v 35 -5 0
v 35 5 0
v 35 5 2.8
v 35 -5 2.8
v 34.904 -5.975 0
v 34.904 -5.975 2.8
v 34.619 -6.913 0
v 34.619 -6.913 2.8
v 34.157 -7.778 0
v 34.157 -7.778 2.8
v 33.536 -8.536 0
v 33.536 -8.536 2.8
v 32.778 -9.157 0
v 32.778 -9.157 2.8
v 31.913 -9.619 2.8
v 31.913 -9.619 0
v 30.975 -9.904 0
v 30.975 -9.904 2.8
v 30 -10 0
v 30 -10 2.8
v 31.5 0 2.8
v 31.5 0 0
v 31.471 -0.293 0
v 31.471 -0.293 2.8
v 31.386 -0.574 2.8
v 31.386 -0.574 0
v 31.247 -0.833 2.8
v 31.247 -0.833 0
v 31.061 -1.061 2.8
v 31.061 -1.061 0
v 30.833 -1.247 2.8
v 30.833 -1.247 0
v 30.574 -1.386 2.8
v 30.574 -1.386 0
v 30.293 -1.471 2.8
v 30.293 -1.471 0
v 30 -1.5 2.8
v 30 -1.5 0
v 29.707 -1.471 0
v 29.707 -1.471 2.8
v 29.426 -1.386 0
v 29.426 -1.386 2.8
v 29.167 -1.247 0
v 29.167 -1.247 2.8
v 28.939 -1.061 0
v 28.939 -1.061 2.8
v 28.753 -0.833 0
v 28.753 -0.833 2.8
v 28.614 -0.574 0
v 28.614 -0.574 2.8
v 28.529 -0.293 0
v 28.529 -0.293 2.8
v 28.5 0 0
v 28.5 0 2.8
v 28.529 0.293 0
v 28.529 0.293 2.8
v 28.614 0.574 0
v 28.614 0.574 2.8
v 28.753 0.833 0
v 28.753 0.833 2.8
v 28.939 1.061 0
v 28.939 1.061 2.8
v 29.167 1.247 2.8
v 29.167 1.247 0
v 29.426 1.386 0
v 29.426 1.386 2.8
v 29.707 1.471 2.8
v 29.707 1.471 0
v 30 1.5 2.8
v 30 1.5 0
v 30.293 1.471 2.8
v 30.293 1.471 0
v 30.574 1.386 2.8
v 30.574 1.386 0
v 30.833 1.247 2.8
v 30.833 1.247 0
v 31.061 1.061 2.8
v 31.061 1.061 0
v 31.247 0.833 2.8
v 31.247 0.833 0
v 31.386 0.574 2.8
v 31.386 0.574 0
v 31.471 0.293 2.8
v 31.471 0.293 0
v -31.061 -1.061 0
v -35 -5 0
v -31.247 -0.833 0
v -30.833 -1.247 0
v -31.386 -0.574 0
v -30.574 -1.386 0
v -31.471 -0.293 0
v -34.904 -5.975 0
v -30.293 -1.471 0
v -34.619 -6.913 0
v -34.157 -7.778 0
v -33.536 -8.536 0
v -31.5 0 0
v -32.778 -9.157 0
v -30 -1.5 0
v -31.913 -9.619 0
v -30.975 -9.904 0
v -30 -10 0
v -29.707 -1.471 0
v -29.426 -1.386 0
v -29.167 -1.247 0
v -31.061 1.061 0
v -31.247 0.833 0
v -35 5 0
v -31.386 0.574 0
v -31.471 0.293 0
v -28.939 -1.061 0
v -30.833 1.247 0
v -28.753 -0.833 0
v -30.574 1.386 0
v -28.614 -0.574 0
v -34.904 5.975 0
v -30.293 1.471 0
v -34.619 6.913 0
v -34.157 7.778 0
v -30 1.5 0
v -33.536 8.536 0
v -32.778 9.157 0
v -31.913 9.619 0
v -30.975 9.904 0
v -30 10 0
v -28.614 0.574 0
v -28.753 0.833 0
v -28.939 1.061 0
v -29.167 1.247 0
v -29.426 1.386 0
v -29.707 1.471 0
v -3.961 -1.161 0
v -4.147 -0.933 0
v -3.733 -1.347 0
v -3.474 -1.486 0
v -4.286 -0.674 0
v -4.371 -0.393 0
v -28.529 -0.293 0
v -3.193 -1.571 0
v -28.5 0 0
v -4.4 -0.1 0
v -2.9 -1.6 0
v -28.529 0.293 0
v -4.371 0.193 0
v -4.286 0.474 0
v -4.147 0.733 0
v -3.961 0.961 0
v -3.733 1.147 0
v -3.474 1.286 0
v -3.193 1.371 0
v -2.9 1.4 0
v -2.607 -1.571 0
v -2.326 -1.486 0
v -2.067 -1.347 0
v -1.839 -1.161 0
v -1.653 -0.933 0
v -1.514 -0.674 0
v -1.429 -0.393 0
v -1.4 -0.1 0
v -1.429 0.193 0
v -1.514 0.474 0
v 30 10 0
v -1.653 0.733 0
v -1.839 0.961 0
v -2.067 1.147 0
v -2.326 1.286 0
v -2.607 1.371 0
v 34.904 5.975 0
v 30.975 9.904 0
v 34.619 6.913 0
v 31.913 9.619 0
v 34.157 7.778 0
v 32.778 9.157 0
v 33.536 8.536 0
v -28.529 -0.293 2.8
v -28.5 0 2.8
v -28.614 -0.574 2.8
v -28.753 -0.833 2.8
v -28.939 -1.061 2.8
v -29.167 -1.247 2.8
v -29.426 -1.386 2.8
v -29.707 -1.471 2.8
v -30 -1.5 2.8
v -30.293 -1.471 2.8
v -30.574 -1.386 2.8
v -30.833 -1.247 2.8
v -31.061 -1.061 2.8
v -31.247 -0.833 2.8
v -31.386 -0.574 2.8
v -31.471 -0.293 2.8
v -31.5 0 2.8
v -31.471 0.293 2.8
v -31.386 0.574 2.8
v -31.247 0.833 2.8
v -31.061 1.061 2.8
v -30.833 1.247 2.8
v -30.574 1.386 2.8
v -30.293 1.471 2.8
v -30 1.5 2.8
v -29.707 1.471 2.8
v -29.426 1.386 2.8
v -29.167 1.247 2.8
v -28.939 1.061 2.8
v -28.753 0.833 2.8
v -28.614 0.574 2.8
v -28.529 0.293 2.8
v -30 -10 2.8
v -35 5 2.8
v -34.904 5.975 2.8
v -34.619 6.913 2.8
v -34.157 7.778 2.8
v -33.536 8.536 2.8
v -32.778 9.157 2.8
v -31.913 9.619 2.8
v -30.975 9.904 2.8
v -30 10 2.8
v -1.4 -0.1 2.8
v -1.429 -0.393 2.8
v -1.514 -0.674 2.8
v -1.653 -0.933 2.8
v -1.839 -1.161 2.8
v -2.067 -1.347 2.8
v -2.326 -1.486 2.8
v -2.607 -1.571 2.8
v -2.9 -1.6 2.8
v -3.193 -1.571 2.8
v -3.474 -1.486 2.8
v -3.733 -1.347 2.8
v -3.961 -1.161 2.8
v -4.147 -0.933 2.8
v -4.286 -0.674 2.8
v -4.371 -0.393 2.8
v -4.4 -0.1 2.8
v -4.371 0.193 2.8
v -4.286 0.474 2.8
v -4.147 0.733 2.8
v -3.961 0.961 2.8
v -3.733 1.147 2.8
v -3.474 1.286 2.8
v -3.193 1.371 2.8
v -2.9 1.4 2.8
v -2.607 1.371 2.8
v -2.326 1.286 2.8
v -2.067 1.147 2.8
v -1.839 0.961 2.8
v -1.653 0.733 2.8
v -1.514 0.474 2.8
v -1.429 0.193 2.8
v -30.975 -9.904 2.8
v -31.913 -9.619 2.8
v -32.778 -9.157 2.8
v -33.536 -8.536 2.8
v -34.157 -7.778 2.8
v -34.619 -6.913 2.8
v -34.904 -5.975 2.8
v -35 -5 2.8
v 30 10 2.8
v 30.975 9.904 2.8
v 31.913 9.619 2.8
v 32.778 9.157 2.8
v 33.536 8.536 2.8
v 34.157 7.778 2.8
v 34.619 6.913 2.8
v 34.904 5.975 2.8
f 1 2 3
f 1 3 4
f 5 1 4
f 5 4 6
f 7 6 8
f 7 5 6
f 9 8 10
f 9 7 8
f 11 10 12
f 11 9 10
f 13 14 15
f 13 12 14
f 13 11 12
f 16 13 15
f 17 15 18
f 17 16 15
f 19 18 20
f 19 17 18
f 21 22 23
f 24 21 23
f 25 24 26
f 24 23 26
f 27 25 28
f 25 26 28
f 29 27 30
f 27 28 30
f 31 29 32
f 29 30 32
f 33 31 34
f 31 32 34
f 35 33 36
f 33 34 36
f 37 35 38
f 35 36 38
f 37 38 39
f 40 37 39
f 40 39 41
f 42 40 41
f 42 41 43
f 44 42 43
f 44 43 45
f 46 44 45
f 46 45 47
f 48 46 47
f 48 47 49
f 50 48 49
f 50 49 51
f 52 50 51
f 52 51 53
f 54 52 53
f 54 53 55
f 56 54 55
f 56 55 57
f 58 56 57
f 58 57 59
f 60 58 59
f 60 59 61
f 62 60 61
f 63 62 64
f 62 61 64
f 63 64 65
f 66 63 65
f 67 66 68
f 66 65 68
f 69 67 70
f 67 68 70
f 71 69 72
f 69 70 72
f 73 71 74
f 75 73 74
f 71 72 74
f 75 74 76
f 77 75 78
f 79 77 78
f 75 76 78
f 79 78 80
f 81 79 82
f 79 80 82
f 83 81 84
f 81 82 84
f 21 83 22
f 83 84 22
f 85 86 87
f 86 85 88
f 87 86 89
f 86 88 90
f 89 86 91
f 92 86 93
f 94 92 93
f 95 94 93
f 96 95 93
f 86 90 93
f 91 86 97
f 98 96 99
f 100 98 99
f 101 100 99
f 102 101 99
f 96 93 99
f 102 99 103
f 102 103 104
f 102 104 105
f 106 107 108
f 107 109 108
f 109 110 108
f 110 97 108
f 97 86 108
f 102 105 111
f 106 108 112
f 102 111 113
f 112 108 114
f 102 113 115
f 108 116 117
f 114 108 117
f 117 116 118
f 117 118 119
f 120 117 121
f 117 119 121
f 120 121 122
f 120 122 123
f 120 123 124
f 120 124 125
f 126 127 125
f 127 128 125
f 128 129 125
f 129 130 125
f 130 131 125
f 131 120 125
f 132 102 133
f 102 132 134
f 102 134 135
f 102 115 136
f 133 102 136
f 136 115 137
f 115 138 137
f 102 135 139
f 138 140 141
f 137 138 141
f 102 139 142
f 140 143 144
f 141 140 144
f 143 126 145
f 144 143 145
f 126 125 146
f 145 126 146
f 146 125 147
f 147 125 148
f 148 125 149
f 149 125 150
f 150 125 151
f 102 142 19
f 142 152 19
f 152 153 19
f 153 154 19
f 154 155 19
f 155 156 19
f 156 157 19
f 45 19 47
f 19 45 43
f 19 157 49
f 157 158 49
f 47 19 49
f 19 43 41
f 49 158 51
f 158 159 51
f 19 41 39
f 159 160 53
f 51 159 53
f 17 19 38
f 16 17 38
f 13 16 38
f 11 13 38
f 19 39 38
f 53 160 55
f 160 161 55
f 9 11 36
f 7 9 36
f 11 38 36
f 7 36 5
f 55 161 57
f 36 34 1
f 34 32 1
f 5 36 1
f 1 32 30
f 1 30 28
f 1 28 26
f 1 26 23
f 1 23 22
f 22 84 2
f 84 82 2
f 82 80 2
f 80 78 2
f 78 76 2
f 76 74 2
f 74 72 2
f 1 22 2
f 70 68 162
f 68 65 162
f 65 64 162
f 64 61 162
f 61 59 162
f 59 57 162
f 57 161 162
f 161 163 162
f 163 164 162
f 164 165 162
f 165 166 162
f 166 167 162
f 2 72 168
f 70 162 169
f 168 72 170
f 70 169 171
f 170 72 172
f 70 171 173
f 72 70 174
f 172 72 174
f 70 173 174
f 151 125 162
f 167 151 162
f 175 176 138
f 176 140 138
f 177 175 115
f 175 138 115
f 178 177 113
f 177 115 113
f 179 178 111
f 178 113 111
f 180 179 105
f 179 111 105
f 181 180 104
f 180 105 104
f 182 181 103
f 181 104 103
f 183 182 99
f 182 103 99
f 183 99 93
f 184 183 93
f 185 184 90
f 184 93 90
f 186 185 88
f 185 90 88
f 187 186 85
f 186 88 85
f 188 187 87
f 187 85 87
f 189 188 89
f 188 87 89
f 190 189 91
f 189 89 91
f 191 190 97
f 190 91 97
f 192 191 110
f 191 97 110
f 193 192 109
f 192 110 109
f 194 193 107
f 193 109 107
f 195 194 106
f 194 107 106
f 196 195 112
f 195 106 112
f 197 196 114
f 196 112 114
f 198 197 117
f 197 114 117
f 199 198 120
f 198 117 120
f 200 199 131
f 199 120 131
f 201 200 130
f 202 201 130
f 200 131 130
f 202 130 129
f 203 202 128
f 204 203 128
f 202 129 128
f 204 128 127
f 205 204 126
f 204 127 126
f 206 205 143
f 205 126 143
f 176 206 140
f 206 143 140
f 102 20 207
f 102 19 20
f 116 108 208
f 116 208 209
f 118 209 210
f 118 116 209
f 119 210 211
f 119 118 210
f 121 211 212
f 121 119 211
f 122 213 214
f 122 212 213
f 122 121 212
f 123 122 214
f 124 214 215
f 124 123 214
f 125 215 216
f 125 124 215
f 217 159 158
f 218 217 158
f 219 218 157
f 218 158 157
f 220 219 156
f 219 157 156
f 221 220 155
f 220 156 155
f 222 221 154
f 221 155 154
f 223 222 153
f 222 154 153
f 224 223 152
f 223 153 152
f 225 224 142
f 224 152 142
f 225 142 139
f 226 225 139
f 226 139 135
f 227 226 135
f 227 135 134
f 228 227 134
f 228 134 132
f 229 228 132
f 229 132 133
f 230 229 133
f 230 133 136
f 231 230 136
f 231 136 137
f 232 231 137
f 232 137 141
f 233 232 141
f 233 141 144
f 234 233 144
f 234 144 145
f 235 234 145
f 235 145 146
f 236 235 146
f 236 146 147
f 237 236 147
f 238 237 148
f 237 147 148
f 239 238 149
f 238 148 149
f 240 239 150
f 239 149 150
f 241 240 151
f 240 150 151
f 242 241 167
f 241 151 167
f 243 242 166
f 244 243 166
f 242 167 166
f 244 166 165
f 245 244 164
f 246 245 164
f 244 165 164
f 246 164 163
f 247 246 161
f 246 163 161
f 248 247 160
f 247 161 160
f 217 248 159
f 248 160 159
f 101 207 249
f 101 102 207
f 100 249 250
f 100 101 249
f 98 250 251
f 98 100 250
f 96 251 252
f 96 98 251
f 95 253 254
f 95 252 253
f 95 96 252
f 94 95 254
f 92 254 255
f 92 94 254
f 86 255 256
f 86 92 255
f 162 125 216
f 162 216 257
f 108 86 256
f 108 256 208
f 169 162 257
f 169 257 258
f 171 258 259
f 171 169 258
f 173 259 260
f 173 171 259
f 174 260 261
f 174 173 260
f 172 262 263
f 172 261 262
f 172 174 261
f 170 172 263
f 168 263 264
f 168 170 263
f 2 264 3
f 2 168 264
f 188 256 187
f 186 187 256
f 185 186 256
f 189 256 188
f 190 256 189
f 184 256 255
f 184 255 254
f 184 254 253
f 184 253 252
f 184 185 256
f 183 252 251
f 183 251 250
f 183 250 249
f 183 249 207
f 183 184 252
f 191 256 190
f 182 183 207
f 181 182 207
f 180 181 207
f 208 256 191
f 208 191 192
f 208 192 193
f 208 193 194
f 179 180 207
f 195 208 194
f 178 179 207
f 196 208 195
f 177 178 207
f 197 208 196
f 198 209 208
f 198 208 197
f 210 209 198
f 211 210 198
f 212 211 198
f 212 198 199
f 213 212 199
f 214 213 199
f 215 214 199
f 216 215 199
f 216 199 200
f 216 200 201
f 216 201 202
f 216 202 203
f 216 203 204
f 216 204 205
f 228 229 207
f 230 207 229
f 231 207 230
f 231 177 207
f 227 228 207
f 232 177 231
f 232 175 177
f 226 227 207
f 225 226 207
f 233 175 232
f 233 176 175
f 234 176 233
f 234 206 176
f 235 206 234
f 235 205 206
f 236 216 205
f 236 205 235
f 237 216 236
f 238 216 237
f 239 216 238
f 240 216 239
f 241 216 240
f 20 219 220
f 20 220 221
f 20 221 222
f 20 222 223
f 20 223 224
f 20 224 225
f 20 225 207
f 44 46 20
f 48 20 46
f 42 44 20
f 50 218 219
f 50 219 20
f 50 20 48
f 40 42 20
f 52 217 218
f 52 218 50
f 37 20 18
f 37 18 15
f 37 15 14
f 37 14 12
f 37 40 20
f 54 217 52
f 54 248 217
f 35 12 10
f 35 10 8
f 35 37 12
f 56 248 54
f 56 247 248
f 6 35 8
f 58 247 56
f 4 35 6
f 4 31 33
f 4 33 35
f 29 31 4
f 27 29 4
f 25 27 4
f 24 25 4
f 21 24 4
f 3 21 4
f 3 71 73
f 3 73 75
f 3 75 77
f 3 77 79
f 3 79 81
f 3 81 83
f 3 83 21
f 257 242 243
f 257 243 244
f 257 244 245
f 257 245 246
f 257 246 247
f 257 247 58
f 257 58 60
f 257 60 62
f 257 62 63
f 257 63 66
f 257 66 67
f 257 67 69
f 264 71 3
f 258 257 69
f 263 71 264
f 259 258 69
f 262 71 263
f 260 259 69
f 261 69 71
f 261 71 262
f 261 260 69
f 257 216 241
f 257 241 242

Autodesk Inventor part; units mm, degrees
ref_plane "YZ Plane" through (0, 0, 0) normal (1, 0, 0) x (0, 1, 0)
ref_plane "XZ Plane" through (0, 0, 0) normal (0, 1, 0) x (-1, 0, 0)
ref_plane "XY Plane" through (0, 0, 0) normal (0, 0, 1) x (1, 0, 0)
sketch "Sketch1" plane through (0, 0, 0) normal (0, 0, 1) x (1, 0, 0)
  line L0 (-30, 10) -> (30, 10)
  line L1 (35, 5) -> (35, -5)
  line L2 (30, -10) -> (-30, -10)
  line L3 (-35, -5) -> (-35, 5)
  line L4 (-50.4497, 0) -> (50.4497, 0) projected
  line L5 (0, -15.4497) -> (0, 15.4497) projected
  arc A0 (-30, 10) -> (-35, 5) centre (-30, 5) ccw
  arc A1 (-35, -5) -> (-30, -10) centre (-30, -5) ccw
  arc A2 (30, -10) -> (35, -5) centre (30, -5) ccw
  arc A3 (35, 5) -> (30, 10) centre (30, 5) ccw
  circle A4 centre (-30, 0) radius 1.5
  circle A5 centre (30, 0) radius 1.5
  circle A6 centre (-2.9, -0.1) radius 1.5
  point P0 (0, 0)
  point P1 (-35, 10)
  point P2 (35, -10)
  point P3 (35, 10)
  point P4 (-35, -10)
  dimension "d2" = 70
  dimension "d3" = 35
  dimension "d4" = 20
  dimension "d5" = 10
  dimension "d6" = 5
  dimension "d9" = 3
  dimension "d10" = 3
extrude "Extrusion2" add sketch "Sketch1" along normal blind 2.8 contours L0 L5 L4 A6 A4 L3 A0 | L0 A3 L1 L4 A5 L5 | L5 L2 A1 L3 L4 A4 A6 | L4 A5 L1 A2 L2 L5
equation "\"d3\" = 0.5 * d2"
equation "\"d5\" = 0.5 * d4"
properties part number "Acrylic_YawServoSupport_4"
